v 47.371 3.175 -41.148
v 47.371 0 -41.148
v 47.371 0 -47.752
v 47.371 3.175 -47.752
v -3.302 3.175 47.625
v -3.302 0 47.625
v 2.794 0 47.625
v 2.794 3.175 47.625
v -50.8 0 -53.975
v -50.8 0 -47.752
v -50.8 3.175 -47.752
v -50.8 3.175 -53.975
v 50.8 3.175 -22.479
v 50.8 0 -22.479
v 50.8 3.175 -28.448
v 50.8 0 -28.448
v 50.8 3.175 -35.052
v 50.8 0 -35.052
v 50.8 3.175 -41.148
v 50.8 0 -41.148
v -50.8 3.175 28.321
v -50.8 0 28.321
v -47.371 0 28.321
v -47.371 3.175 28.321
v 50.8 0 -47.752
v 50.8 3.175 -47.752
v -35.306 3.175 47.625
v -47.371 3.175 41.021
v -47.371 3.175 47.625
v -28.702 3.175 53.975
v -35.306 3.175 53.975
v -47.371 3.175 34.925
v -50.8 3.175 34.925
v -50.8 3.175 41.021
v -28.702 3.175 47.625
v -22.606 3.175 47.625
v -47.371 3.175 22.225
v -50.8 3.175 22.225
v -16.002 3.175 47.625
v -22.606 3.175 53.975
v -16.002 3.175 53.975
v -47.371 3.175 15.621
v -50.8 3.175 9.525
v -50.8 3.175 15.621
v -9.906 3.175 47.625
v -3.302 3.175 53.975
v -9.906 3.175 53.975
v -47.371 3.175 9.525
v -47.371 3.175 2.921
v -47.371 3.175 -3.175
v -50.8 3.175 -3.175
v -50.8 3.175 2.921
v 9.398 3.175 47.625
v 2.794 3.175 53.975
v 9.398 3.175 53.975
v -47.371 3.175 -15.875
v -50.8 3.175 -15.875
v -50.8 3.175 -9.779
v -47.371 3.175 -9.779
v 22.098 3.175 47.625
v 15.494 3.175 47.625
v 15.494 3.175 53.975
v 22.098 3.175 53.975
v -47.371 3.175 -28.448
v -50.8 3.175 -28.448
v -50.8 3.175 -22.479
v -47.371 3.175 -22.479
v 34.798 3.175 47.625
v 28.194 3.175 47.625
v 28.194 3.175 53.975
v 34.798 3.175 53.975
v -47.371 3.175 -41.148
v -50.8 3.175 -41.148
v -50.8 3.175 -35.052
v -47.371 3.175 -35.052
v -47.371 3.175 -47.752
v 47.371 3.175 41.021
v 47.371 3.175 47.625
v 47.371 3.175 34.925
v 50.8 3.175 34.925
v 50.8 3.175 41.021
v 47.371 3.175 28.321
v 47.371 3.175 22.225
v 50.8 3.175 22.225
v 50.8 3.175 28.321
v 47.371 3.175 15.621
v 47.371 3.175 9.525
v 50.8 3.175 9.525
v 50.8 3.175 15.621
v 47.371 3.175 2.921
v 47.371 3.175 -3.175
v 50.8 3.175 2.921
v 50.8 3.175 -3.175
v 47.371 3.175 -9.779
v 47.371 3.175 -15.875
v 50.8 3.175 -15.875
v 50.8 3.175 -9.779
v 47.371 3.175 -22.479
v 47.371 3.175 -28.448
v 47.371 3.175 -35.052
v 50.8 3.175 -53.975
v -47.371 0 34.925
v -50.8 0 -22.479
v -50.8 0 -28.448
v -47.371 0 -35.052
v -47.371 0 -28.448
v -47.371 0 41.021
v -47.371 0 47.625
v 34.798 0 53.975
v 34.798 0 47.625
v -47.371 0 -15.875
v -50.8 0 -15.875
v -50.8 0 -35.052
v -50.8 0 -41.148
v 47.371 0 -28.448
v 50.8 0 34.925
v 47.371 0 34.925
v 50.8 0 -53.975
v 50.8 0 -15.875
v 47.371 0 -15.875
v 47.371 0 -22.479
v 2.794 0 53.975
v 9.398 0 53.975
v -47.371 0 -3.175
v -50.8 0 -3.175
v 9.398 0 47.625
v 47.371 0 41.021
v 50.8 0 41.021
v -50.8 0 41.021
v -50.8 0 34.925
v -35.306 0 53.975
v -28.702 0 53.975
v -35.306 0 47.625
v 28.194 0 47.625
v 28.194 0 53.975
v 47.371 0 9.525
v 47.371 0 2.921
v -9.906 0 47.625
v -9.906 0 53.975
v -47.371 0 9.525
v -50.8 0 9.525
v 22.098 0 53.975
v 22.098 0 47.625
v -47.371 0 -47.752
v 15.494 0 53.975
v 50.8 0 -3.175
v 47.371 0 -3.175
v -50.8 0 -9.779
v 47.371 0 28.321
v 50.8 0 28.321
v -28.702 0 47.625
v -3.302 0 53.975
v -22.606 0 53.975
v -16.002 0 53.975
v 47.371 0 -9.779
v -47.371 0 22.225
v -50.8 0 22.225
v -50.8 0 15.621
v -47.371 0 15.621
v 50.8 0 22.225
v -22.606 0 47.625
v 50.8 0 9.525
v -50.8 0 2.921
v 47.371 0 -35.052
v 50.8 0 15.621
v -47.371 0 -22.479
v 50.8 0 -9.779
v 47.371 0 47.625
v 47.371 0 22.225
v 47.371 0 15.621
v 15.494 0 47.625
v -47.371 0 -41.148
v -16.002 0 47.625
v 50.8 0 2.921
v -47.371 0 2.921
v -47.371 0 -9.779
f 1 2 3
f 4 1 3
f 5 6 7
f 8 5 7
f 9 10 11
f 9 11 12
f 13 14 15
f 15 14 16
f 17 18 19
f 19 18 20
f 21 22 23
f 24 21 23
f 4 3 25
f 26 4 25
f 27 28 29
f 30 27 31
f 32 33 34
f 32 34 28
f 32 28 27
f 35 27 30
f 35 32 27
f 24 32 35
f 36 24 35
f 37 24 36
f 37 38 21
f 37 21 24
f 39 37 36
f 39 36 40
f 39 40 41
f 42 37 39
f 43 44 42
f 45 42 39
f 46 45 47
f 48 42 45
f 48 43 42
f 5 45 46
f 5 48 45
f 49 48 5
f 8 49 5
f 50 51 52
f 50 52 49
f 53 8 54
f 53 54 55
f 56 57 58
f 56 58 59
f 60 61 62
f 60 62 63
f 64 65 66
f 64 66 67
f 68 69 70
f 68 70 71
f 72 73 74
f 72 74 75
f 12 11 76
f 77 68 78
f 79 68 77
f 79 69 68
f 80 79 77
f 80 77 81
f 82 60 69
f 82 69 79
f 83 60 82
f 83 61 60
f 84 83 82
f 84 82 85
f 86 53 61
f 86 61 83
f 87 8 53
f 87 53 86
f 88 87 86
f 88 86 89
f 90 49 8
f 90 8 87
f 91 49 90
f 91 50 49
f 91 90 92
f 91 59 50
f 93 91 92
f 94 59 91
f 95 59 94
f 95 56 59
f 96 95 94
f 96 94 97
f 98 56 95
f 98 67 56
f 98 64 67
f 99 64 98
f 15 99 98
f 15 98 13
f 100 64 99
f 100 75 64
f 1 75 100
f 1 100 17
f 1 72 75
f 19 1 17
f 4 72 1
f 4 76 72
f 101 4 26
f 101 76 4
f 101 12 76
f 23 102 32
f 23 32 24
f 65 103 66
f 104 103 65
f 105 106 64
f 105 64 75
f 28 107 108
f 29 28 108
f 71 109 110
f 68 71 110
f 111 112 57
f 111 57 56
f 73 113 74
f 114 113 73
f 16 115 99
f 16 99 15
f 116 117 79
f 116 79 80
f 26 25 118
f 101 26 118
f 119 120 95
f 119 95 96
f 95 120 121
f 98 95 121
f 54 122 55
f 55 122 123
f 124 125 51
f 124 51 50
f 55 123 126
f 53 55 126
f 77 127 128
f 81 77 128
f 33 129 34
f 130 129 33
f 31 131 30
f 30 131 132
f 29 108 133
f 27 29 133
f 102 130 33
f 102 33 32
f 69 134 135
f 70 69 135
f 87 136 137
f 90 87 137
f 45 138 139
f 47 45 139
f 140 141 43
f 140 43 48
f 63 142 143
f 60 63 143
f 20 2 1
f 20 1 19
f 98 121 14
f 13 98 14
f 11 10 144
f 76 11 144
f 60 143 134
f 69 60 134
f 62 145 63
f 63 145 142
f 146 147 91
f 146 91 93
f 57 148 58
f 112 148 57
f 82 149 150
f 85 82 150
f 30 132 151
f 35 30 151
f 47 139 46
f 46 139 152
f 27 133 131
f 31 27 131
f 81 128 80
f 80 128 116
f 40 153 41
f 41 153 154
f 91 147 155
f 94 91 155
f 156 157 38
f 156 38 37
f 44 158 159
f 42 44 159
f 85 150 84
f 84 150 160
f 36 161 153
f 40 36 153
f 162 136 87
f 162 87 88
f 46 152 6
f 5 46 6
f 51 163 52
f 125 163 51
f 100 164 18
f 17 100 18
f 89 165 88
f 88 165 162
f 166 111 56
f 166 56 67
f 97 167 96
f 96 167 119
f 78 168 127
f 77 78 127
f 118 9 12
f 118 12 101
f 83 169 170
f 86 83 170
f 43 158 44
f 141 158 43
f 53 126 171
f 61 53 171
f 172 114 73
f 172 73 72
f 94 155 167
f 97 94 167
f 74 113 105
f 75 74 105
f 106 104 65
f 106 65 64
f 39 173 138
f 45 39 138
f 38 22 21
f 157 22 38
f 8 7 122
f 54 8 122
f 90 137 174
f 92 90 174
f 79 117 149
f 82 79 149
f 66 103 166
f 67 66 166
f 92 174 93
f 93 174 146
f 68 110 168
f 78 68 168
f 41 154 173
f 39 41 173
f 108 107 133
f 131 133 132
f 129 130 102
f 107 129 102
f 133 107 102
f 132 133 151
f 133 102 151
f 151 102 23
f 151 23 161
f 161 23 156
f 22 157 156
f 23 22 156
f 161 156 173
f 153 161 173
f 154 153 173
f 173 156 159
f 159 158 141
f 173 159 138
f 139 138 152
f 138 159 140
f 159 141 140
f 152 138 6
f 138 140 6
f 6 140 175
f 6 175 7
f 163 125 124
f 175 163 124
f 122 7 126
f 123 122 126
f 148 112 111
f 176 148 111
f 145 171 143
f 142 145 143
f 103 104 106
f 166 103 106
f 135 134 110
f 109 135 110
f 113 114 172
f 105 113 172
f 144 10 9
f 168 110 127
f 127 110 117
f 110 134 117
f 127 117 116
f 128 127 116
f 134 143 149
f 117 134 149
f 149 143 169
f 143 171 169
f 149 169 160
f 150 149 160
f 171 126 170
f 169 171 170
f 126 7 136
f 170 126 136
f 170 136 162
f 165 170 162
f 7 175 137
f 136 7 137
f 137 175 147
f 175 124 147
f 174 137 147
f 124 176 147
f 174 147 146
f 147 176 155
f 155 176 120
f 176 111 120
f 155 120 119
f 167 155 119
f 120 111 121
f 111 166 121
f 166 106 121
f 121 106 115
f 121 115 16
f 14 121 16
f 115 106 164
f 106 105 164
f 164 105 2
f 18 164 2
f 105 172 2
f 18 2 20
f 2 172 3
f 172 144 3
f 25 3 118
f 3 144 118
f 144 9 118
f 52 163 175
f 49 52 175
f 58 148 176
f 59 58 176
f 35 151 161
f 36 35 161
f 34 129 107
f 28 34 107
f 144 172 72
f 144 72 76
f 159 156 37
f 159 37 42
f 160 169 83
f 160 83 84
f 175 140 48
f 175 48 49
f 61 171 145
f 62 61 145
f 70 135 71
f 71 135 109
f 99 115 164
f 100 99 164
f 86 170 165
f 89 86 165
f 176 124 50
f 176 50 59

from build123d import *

# Parameters (mm, degrees)
SKETCH1_W               = 101.6
SKETCH1_H               = 107.95
BOSS_EXTRUDE1_DEPTH     = 3.175
CUT_EXTRUDE1_DEPTH      = 75.189091179
CUT_EXTRUDE1_DEPTH_BACK = 75.189091179
SKETCH2_W               = 3.429
SKETCH2_H               = 6.604


with BuildPart() as part:
    # Sketch1 → Boss-Extrude1 (new body)
    with BuildSketch(Plane(origin=(0, 0, 0), x_dir=(1, 0, 0), z_dir=(0, 1, 0))):
        Rectangle(SKETCH1_W, SKETCH1_H)
    extrude(amount=BOSS_EXTRUDE1_DEPTH)

    # Sketch2 → Cut-Extrude1 (cut, two sides: drawn at the far end of the back side and taken through both)
    with BuildSketch(Plane(origin=(0, 3.175, 0), x_dir=(1, 0, 0), z_dir=(0, 1, 0)).offset(-CUT_EXTRUDE1_DEPTH_BACK)):
        Polygon((22.098, -47.625), (28.194, -47.625), (28.194, -54.229), (34.798, -54.229), (34.798, -47.625), (47.371, -47.625), (47.371, -41.021), (50.8, -41.021), (50.8, -47.625), (50.8, -92.544961432), (-50.8, -92.544961432), (-50.8, -47.625), (-50.8, -41.021), (-47.371, -41.021), (-47.371, -47.625), (-35.306, -47.625), (-35.306, -54.229), (-28.702, -54.229), (-28.702, -47.625), (-22.606, -47.625), (-22.606, -54.229), (-16.002, -54.229), (-16.002, -47.625), (-9.906, -47.625), (-9.906, -54.229), (-3.302, -54.229), (-3.302, -47.625), (2.794, -47.625), (2.794, -54.229), (9.398, -54.229), (9.398, -47.625), (15.494, -47.625), (15.494, -54.229), (22.098, -54.229), align=None)
        with Locations((-49.0855, 31.75)):
            Rectangle(SKETCH2_W, SKETCH2_H)
        with Locations((-49.0855, 19.177)):
            Rectangle(SKETCH2_W, SKETCH2_H)
        with Locations((-49.0855, 6.477)):
            Rectangle(SKETCH2_W, SKETCH2_H)
        with Locations((-49.0855, -6.223)):
            Rectangle(SKETCH2_W, SKETCH2_H)
        with Locations((-49.0855, -18.923)):
            Rectangle(SKETCH2_W, SKETCH2_H)
        with Locations((-49.0855, -31.623)):
            Rectangle(SKETCH2_W, SKETCH2_H)
        with Locations((49.0855, -31.623)):
            Rectangle(SKETCH2_W, SKETCH2_H)
        with Locations((49.0855, -18.923)):
            Rectangle(SKETCH2_W, SKETCH2_H)
        with Locations((49.0855, -6.223)):
            Rectangle(SKETCH2_W, SKETCH2_H)
        with Locations((49.0855, 6.477)):
            Rectangle(SKETCH2_W, SKETCH2_H)
        with Locations((49.0855, 19.177)):
            Rectangle(SKETCH2_W, SKETCH2_H)
        with Locations((49.0855, 31.75)):
            Rectangle(SKETCH2_W, SKETCH2_H)
        with Locations((49.0855, 44.45)):
            Rectangle(SKETCH2_W, SKETCH2_H)
        with Locations((-49.0855, 44.45)):
            Rectangle(SKETCH2_W, SKETCH2_H)
    extrude(amount=CUT_EXTRUDE1_DEPTH + CUT_EXTRUDE1_DEPTH_BACK, mode=Mode.SUBTRACT)


solid = part.part
